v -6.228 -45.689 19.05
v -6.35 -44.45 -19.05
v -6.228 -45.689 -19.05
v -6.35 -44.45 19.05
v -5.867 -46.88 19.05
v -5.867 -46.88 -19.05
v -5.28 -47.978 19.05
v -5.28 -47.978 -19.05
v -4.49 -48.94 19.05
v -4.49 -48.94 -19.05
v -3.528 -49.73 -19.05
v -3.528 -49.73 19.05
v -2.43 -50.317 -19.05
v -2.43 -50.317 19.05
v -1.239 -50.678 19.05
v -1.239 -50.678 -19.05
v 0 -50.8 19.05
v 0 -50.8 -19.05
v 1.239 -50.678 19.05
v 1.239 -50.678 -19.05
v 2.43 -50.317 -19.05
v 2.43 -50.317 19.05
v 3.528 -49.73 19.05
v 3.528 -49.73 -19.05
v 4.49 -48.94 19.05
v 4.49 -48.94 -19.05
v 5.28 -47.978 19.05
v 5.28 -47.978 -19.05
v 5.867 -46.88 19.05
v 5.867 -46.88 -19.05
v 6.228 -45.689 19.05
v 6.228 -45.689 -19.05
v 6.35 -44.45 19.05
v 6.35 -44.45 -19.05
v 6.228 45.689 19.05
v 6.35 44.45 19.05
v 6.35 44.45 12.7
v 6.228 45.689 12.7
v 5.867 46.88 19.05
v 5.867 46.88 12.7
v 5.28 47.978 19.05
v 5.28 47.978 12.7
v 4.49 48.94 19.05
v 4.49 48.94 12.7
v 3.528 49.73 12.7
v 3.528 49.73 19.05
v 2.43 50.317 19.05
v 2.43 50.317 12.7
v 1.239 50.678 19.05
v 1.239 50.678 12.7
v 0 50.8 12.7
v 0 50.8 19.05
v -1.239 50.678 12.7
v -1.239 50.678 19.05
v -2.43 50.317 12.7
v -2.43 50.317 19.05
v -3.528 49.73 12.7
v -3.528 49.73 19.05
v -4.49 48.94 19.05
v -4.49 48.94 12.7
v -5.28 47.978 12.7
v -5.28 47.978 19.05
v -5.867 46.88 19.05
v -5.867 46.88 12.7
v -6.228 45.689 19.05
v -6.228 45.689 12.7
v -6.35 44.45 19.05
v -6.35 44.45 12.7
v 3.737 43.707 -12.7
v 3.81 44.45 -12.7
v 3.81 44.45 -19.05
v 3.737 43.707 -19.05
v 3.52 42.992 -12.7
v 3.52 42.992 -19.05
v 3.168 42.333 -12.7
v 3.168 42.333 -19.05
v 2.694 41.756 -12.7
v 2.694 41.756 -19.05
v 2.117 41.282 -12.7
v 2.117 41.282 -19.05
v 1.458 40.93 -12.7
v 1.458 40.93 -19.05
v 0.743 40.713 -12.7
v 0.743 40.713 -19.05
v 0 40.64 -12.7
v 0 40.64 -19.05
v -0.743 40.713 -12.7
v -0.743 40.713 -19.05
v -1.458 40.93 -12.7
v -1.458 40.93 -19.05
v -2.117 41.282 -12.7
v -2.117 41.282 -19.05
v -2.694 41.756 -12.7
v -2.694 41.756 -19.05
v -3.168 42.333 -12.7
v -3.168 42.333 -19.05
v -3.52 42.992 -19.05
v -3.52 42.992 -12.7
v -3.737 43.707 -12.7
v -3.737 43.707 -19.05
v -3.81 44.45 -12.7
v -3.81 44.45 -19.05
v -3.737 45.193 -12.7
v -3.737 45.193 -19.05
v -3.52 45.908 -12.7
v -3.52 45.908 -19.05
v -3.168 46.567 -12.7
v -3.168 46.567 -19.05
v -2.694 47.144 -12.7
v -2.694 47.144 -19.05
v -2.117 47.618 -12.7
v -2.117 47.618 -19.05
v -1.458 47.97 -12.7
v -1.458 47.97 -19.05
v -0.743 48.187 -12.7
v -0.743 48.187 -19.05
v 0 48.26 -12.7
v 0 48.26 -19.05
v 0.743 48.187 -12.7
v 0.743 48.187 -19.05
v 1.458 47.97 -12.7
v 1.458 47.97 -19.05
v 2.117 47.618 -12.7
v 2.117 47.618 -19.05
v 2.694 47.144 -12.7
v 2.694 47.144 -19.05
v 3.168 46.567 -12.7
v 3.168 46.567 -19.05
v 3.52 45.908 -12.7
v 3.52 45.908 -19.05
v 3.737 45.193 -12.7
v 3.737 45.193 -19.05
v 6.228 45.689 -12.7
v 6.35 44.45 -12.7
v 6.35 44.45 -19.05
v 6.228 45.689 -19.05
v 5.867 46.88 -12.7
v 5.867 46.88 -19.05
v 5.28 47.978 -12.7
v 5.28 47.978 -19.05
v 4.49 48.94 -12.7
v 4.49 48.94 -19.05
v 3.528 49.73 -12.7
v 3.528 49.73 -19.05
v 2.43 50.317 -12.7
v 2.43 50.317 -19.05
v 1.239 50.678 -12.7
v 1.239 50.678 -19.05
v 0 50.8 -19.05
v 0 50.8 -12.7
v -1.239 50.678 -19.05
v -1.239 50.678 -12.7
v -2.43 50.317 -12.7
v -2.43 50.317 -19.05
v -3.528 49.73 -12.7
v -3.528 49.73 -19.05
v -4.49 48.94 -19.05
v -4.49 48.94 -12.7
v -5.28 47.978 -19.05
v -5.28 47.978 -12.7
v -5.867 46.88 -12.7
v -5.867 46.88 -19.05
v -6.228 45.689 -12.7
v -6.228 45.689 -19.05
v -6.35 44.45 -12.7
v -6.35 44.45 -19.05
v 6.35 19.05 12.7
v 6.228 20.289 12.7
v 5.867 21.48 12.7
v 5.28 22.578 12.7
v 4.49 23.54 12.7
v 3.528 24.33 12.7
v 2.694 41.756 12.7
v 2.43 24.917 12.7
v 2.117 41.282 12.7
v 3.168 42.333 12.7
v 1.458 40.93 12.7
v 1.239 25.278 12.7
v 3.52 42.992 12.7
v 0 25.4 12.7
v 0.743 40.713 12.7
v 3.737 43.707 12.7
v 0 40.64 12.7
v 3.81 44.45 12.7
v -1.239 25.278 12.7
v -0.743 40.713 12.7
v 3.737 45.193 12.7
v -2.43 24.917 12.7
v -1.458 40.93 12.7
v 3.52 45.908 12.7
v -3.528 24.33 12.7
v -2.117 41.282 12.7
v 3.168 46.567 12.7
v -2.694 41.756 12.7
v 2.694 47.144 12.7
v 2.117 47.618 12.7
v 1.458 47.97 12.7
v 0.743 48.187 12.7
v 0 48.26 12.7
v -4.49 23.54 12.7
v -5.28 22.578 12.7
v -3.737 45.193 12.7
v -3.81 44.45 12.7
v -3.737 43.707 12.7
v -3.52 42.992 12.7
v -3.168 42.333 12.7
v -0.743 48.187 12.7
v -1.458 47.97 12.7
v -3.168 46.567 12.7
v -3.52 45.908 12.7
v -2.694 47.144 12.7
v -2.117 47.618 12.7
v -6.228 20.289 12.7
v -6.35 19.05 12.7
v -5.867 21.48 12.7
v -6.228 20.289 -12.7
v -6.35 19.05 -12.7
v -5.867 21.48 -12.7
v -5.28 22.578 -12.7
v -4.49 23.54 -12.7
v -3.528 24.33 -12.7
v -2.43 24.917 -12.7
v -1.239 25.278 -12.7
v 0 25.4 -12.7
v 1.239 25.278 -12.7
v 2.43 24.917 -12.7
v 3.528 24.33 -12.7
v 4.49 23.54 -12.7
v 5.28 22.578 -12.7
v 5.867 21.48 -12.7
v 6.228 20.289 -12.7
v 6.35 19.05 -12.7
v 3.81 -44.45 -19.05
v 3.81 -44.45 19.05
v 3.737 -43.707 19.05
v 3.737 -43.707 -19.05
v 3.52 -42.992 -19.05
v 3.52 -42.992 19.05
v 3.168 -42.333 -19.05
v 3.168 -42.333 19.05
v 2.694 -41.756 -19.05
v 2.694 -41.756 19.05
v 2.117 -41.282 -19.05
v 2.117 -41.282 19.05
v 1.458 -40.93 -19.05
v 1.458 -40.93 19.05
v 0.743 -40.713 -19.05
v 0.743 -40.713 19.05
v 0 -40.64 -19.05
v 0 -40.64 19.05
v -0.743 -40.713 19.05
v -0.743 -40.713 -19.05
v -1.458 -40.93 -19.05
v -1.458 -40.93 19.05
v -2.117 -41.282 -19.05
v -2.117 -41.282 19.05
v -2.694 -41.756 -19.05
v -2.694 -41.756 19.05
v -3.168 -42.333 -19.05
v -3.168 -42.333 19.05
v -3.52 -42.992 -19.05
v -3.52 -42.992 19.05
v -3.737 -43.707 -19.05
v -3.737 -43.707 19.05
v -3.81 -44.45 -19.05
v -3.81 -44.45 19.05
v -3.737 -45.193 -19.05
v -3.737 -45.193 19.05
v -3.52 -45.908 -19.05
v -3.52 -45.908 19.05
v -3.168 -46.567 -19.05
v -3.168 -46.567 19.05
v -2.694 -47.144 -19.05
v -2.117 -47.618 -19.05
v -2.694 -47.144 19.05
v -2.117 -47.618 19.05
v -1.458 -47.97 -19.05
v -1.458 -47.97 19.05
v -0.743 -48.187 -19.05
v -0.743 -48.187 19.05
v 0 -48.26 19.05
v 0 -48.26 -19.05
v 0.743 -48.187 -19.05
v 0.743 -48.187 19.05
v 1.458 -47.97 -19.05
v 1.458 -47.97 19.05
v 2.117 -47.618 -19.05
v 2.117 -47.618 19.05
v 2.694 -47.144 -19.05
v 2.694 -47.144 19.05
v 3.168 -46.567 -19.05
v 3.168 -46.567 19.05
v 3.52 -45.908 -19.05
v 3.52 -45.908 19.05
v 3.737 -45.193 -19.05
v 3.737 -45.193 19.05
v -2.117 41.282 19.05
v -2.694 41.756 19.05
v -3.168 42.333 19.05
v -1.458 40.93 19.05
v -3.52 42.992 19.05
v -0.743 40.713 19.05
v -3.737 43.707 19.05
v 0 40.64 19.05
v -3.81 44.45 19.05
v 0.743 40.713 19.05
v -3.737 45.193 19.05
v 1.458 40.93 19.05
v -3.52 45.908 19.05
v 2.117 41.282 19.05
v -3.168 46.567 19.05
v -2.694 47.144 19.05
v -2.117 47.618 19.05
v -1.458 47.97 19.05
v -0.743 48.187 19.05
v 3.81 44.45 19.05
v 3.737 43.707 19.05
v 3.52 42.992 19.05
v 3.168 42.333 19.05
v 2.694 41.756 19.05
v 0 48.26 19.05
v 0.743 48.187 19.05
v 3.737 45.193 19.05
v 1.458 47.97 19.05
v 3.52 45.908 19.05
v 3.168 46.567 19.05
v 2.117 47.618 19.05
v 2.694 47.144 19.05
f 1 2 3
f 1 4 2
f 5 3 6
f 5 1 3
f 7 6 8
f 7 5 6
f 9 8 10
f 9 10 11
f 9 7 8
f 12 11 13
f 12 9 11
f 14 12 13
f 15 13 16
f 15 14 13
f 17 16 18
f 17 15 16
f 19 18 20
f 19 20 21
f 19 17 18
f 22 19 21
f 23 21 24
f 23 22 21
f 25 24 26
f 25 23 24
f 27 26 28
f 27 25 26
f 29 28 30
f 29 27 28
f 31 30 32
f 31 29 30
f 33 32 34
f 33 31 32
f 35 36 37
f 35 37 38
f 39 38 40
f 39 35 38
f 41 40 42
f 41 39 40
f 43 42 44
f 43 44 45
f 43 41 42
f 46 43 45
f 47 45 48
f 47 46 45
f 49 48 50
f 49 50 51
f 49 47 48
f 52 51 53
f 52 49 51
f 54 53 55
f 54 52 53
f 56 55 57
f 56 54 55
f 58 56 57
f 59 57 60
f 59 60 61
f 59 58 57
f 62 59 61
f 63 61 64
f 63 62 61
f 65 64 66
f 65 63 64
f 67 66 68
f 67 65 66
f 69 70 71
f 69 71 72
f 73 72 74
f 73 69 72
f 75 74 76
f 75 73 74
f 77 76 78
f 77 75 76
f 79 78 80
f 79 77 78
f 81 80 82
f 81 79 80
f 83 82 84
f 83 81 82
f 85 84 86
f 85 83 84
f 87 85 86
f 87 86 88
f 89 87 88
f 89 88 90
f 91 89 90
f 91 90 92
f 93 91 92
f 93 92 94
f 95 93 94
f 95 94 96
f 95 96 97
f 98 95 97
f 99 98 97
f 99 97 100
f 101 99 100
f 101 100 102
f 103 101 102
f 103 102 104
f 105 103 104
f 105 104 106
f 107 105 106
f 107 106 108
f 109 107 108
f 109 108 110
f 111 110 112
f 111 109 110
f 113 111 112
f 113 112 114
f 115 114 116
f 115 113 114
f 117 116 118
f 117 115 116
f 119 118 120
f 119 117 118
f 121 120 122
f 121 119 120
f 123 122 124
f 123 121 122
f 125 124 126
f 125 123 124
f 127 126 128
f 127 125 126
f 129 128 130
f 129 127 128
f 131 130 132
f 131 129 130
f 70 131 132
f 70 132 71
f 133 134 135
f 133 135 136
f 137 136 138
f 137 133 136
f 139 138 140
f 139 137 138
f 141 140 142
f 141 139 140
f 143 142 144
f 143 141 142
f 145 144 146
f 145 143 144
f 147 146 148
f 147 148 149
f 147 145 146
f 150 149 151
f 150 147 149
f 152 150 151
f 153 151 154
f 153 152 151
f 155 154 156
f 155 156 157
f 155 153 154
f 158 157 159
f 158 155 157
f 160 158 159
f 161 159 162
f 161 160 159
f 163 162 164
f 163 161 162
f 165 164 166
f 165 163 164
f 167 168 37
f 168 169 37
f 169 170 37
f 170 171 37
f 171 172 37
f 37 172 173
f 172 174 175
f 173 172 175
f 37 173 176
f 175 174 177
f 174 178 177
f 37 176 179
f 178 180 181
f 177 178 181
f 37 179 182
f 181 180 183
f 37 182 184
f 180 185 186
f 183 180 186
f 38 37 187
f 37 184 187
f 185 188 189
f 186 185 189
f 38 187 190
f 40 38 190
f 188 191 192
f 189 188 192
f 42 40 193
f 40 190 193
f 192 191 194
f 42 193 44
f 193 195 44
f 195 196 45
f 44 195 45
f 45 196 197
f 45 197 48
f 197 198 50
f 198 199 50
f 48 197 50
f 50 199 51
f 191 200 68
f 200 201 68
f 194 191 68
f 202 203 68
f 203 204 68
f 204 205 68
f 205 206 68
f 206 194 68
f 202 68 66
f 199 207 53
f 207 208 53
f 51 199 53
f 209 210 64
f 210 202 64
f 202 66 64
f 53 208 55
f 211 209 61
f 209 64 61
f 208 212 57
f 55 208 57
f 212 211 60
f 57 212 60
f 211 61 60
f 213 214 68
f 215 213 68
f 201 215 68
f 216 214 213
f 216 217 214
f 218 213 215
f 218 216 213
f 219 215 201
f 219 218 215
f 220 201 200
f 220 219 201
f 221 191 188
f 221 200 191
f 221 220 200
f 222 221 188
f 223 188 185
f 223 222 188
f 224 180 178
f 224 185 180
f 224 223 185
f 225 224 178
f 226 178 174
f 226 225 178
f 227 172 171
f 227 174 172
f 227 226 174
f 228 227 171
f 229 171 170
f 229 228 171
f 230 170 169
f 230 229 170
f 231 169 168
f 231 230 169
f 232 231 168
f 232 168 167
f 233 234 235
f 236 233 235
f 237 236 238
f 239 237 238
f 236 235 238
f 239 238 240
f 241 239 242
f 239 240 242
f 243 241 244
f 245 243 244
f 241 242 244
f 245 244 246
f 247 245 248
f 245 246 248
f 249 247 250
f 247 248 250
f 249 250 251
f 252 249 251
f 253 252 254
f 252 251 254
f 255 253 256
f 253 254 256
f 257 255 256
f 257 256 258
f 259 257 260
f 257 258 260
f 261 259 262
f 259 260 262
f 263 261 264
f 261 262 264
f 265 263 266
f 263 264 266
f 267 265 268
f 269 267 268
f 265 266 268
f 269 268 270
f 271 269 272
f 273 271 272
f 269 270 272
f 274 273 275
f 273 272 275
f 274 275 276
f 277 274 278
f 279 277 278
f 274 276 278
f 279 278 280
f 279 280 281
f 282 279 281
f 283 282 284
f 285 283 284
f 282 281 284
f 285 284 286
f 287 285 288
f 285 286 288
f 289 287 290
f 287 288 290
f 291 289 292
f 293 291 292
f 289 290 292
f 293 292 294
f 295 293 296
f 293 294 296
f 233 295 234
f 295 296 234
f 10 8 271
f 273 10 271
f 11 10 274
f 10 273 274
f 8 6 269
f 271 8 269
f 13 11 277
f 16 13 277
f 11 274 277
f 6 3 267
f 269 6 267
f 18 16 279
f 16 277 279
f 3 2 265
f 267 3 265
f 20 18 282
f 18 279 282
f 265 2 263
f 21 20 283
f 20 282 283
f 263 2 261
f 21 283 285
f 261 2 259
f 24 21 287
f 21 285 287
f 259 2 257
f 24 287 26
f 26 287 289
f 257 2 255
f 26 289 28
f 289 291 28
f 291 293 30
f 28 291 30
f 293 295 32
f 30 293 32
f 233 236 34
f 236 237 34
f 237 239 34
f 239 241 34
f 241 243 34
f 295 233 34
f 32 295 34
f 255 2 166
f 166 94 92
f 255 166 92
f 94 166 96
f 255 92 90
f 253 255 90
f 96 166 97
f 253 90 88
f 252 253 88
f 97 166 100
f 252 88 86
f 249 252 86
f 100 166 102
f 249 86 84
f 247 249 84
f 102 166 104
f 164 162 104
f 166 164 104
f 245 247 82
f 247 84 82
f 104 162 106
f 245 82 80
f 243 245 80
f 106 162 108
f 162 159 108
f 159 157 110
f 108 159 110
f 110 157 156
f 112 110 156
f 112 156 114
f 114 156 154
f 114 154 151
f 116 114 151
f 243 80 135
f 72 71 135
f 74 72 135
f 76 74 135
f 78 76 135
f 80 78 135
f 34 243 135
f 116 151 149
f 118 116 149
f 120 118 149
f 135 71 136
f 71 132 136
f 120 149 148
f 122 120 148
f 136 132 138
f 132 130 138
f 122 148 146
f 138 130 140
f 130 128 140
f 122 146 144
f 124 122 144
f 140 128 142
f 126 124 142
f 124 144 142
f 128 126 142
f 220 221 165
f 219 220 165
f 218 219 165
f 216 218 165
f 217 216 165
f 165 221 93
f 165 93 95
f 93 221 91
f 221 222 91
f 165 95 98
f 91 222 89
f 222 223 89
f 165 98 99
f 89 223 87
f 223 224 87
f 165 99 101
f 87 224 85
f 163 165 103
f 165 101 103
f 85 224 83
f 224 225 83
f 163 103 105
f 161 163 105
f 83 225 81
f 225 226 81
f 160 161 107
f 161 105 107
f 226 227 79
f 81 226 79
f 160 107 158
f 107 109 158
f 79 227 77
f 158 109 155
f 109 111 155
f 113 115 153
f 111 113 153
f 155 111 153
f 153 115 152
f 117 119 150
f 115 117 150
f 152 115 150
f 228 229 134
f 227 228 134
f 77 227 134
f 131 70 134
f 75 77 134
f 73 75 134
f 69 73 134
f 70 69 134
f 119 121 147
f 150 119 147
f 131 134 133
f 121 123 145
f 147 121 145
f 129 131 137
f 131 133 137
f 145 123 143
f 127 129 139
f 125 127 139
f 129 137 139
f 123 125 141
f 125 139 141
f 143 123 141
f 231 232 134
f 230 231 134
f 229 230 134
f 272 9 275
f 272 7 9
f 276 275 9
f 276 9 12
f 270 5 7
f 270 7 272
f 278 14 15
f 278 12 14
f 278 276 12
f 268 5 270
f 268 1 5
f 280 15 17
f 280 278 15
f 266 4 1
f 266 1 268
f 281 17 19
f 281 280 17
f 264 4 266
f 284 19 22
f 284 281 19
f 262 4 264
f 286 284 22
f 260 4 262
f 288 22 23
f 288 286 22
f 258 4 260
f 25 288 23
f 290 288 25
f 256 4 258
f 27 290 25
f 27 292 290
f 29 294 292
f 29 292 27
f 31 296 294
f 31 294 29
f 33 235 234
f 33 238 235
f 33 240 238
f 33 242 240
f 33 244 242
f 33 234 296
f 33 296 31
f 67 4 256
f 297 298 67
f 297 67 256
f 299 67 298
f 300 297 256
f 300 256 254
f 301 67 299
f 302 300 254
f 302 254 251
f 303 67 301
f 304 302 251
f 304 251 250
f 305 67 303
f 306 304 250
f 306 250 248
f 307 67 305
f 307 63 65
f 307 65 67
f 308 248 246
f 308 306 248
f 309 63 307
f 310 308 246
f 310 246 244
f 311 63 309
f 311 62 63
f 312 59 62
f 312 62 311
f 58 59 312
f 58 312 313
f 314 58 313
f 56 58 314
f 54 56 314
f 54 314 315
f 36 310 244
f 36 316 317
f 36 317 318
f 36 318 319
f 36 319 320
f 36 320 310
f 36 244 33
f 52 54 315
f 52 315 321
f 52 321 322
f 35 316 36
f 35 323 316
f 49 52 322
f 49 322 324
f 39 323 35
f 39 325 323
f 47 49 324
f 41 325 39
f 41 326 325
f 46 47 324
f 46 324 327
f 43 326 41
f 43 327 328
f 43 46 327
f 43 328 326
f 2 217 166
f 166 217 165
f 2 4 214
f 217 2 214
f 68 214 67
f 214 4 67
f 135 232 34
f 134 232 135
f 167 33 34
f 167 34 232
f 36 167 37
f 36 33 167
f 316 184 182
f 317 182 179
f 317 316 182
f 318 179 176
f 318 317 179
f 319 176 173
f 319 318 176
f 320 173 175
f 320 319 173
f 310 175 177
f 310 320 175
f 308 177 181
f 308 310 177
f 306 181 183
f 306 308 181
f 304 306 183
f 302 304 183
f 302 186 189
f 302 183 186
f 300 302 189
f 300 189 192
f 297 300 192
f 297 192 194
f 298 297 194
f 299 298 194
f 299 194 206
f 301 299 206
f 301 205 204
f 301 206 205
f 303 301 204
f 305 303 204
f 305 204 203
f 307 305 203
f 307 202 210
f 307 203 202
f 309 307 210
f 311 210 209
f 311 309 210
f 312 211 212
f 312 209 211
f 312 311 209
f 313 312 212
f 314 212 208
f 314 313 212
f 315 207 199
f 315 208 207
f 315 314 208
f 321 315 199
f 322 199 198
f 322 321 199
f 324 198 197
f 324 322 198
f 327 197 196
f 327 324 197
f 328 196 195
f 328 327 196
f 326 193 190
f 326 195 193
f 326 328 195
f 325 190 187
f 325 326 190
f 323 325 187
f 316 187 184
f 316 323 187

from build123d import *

# Parameters (mm, degrees)
SKETCH1_W           = 12.7
SKETCH1_H           = 101.6
BOSS_EXTRUDE1_DEPTH = 19.05
FILLET2_RADIUS      = 6.35
FILLET2_LENGTH      = 38.1
SKETCH2_R           = 3.81
CUT_EXTRUDE1_DEPTH  = 38.1
FILLET3_RADIUS      = 6.35
FILLET3_LENGTH      = 38.1
SKETCH3_W           = 25.4
SKETCH3_H           = 25.4
CUT_EXTRUDE2_DEPTH  = 56.72102386
FILLET4_RADIUS      = 6.35
FILLET4_LENGTH      = 25.4


with BuildPart() as part:
    # Sketch1 → Boss-Extrude1 (new, symmetric)
    with BuildSketch(Plane.XY):
        Rectangle(SKETCH1_W, SKETCH1_H)
    extrude(amount=BOSS_EXTRUDE1_DEPTH, both=True)

    # Fillet2: full round fillet: the end face becomes a half cylinder, R = half its width
    fillet2_face = Plane((0, -50.8, 0), x_dir=(0, 0, 1), z_dir=(0, -1, 0))  # on the end face: x along it, z out of the body
    fillet2_slab = fillet2_face.offset(-FILLET2_RADIUS / 2) * Box(FILLET2_LENGTH, 2 * FILLET2_RADIUS, FILLET2_RADIUS, mode=Mode.PRIVATE)  # the body's end, R deep
    fillet2_round = Plane((0, -44.45, 0), x_dir=(0, -1, 0), z_dir=(0, 0, 1)) * Cylinder(FILLET2_RADIUS, FILLET2_LENGTH, mode=Mode.PRIVATE)  # its axis R under the face
    add(fillet2_slab - fillet2_round, mode=Mode.SUBTRACT)

    # Sketch2 → Cut-Extrude1 (cut)
    with BuildSketch(Plane.XY.offset(19.05)):
        with Locations((0, -44.45)):
            Circle(SKETCH2_R)
    cut_extrude1 = extrude(amount=-CUT_EXTRUDE1_DEPTH, mode=Mode.SUBTRACT)

    # Mirror3: Cut-Extrude1 across plane
    add(cut_extrude1.mirror(Plane.ZX), mode=Mode.SUBTRACT)

    # Fillet3: full round fillet: the end face becomes a half cylinder, R = half its width
    fillet3_face = Plane((0, 50.8, 0), x_dir=(0, 0, 1), z_dir=(0, 1, 0))  # on the end face: x along it, z out of the body
    fillet3_slab = fillet3_face.offset(-FILLET3_RADIUS / 2) * Box(FILLET3_LENGTH, 2 * FILLET3_RADIUS, FILLET3_RADIUS, mode=Mode.PRIVATE)  # the body's end, R deep
    fillet3_round = Plane((0, 44.45, 0), x_dir=(0, 1, 0), z_dir=(0, 0, 1)) * Cylinder(FILLET3_RADIUS, FILLET3_LENGTH, mode=Mode.PRIVATE)  # its axis R under the face
    add(fillet3_slab - fillet3_round, mode=Mode.SUBTRACT)

    # Sketch3 → Cut-Extrude2 (cut, through all)
    with BuildSketch(Plane.ZY.offset(6.35)):
        with Locations((0, 38.1)):
            Rectangle(SKETCH3_W, SKETCH3_H)
    extrude(amount=-CUT_EXTRUDE2_DEPTH, mode=Mode.SUBTRACT)

    # Fillet4: full round fillet: the end face becomes a half cylinder, R = half its width
    fillet4_face = Plane((0, 25.4, 0), x_dir=(0, 0, -1), z_dir=(0, 1, 0))  # on the end face: x along it, z out of the body
    fillet4_slab = fillet4_face.offset(-FILLET4_RADIUS / 2) * Box(FILLET4_LENGTH, 2 * FILLET4_RADIUS, FILLET4_RADIUS, mode=Mode.PRIVATE)  # the body's end, R deep
    fillet4_round = Plane((0, 19.05, 0), x_dir=(0, 1, 0), z_dir=(0, 0, -1)) * Cylinder(FILLET4_RADIUS, FILLET4_LENGTH, mode=Mode.PRIVATE)  # its axis R under the face
    add(fillet4_slab - fillet4_round, mode=Mode.SUBTRACT)


solid = part.part
